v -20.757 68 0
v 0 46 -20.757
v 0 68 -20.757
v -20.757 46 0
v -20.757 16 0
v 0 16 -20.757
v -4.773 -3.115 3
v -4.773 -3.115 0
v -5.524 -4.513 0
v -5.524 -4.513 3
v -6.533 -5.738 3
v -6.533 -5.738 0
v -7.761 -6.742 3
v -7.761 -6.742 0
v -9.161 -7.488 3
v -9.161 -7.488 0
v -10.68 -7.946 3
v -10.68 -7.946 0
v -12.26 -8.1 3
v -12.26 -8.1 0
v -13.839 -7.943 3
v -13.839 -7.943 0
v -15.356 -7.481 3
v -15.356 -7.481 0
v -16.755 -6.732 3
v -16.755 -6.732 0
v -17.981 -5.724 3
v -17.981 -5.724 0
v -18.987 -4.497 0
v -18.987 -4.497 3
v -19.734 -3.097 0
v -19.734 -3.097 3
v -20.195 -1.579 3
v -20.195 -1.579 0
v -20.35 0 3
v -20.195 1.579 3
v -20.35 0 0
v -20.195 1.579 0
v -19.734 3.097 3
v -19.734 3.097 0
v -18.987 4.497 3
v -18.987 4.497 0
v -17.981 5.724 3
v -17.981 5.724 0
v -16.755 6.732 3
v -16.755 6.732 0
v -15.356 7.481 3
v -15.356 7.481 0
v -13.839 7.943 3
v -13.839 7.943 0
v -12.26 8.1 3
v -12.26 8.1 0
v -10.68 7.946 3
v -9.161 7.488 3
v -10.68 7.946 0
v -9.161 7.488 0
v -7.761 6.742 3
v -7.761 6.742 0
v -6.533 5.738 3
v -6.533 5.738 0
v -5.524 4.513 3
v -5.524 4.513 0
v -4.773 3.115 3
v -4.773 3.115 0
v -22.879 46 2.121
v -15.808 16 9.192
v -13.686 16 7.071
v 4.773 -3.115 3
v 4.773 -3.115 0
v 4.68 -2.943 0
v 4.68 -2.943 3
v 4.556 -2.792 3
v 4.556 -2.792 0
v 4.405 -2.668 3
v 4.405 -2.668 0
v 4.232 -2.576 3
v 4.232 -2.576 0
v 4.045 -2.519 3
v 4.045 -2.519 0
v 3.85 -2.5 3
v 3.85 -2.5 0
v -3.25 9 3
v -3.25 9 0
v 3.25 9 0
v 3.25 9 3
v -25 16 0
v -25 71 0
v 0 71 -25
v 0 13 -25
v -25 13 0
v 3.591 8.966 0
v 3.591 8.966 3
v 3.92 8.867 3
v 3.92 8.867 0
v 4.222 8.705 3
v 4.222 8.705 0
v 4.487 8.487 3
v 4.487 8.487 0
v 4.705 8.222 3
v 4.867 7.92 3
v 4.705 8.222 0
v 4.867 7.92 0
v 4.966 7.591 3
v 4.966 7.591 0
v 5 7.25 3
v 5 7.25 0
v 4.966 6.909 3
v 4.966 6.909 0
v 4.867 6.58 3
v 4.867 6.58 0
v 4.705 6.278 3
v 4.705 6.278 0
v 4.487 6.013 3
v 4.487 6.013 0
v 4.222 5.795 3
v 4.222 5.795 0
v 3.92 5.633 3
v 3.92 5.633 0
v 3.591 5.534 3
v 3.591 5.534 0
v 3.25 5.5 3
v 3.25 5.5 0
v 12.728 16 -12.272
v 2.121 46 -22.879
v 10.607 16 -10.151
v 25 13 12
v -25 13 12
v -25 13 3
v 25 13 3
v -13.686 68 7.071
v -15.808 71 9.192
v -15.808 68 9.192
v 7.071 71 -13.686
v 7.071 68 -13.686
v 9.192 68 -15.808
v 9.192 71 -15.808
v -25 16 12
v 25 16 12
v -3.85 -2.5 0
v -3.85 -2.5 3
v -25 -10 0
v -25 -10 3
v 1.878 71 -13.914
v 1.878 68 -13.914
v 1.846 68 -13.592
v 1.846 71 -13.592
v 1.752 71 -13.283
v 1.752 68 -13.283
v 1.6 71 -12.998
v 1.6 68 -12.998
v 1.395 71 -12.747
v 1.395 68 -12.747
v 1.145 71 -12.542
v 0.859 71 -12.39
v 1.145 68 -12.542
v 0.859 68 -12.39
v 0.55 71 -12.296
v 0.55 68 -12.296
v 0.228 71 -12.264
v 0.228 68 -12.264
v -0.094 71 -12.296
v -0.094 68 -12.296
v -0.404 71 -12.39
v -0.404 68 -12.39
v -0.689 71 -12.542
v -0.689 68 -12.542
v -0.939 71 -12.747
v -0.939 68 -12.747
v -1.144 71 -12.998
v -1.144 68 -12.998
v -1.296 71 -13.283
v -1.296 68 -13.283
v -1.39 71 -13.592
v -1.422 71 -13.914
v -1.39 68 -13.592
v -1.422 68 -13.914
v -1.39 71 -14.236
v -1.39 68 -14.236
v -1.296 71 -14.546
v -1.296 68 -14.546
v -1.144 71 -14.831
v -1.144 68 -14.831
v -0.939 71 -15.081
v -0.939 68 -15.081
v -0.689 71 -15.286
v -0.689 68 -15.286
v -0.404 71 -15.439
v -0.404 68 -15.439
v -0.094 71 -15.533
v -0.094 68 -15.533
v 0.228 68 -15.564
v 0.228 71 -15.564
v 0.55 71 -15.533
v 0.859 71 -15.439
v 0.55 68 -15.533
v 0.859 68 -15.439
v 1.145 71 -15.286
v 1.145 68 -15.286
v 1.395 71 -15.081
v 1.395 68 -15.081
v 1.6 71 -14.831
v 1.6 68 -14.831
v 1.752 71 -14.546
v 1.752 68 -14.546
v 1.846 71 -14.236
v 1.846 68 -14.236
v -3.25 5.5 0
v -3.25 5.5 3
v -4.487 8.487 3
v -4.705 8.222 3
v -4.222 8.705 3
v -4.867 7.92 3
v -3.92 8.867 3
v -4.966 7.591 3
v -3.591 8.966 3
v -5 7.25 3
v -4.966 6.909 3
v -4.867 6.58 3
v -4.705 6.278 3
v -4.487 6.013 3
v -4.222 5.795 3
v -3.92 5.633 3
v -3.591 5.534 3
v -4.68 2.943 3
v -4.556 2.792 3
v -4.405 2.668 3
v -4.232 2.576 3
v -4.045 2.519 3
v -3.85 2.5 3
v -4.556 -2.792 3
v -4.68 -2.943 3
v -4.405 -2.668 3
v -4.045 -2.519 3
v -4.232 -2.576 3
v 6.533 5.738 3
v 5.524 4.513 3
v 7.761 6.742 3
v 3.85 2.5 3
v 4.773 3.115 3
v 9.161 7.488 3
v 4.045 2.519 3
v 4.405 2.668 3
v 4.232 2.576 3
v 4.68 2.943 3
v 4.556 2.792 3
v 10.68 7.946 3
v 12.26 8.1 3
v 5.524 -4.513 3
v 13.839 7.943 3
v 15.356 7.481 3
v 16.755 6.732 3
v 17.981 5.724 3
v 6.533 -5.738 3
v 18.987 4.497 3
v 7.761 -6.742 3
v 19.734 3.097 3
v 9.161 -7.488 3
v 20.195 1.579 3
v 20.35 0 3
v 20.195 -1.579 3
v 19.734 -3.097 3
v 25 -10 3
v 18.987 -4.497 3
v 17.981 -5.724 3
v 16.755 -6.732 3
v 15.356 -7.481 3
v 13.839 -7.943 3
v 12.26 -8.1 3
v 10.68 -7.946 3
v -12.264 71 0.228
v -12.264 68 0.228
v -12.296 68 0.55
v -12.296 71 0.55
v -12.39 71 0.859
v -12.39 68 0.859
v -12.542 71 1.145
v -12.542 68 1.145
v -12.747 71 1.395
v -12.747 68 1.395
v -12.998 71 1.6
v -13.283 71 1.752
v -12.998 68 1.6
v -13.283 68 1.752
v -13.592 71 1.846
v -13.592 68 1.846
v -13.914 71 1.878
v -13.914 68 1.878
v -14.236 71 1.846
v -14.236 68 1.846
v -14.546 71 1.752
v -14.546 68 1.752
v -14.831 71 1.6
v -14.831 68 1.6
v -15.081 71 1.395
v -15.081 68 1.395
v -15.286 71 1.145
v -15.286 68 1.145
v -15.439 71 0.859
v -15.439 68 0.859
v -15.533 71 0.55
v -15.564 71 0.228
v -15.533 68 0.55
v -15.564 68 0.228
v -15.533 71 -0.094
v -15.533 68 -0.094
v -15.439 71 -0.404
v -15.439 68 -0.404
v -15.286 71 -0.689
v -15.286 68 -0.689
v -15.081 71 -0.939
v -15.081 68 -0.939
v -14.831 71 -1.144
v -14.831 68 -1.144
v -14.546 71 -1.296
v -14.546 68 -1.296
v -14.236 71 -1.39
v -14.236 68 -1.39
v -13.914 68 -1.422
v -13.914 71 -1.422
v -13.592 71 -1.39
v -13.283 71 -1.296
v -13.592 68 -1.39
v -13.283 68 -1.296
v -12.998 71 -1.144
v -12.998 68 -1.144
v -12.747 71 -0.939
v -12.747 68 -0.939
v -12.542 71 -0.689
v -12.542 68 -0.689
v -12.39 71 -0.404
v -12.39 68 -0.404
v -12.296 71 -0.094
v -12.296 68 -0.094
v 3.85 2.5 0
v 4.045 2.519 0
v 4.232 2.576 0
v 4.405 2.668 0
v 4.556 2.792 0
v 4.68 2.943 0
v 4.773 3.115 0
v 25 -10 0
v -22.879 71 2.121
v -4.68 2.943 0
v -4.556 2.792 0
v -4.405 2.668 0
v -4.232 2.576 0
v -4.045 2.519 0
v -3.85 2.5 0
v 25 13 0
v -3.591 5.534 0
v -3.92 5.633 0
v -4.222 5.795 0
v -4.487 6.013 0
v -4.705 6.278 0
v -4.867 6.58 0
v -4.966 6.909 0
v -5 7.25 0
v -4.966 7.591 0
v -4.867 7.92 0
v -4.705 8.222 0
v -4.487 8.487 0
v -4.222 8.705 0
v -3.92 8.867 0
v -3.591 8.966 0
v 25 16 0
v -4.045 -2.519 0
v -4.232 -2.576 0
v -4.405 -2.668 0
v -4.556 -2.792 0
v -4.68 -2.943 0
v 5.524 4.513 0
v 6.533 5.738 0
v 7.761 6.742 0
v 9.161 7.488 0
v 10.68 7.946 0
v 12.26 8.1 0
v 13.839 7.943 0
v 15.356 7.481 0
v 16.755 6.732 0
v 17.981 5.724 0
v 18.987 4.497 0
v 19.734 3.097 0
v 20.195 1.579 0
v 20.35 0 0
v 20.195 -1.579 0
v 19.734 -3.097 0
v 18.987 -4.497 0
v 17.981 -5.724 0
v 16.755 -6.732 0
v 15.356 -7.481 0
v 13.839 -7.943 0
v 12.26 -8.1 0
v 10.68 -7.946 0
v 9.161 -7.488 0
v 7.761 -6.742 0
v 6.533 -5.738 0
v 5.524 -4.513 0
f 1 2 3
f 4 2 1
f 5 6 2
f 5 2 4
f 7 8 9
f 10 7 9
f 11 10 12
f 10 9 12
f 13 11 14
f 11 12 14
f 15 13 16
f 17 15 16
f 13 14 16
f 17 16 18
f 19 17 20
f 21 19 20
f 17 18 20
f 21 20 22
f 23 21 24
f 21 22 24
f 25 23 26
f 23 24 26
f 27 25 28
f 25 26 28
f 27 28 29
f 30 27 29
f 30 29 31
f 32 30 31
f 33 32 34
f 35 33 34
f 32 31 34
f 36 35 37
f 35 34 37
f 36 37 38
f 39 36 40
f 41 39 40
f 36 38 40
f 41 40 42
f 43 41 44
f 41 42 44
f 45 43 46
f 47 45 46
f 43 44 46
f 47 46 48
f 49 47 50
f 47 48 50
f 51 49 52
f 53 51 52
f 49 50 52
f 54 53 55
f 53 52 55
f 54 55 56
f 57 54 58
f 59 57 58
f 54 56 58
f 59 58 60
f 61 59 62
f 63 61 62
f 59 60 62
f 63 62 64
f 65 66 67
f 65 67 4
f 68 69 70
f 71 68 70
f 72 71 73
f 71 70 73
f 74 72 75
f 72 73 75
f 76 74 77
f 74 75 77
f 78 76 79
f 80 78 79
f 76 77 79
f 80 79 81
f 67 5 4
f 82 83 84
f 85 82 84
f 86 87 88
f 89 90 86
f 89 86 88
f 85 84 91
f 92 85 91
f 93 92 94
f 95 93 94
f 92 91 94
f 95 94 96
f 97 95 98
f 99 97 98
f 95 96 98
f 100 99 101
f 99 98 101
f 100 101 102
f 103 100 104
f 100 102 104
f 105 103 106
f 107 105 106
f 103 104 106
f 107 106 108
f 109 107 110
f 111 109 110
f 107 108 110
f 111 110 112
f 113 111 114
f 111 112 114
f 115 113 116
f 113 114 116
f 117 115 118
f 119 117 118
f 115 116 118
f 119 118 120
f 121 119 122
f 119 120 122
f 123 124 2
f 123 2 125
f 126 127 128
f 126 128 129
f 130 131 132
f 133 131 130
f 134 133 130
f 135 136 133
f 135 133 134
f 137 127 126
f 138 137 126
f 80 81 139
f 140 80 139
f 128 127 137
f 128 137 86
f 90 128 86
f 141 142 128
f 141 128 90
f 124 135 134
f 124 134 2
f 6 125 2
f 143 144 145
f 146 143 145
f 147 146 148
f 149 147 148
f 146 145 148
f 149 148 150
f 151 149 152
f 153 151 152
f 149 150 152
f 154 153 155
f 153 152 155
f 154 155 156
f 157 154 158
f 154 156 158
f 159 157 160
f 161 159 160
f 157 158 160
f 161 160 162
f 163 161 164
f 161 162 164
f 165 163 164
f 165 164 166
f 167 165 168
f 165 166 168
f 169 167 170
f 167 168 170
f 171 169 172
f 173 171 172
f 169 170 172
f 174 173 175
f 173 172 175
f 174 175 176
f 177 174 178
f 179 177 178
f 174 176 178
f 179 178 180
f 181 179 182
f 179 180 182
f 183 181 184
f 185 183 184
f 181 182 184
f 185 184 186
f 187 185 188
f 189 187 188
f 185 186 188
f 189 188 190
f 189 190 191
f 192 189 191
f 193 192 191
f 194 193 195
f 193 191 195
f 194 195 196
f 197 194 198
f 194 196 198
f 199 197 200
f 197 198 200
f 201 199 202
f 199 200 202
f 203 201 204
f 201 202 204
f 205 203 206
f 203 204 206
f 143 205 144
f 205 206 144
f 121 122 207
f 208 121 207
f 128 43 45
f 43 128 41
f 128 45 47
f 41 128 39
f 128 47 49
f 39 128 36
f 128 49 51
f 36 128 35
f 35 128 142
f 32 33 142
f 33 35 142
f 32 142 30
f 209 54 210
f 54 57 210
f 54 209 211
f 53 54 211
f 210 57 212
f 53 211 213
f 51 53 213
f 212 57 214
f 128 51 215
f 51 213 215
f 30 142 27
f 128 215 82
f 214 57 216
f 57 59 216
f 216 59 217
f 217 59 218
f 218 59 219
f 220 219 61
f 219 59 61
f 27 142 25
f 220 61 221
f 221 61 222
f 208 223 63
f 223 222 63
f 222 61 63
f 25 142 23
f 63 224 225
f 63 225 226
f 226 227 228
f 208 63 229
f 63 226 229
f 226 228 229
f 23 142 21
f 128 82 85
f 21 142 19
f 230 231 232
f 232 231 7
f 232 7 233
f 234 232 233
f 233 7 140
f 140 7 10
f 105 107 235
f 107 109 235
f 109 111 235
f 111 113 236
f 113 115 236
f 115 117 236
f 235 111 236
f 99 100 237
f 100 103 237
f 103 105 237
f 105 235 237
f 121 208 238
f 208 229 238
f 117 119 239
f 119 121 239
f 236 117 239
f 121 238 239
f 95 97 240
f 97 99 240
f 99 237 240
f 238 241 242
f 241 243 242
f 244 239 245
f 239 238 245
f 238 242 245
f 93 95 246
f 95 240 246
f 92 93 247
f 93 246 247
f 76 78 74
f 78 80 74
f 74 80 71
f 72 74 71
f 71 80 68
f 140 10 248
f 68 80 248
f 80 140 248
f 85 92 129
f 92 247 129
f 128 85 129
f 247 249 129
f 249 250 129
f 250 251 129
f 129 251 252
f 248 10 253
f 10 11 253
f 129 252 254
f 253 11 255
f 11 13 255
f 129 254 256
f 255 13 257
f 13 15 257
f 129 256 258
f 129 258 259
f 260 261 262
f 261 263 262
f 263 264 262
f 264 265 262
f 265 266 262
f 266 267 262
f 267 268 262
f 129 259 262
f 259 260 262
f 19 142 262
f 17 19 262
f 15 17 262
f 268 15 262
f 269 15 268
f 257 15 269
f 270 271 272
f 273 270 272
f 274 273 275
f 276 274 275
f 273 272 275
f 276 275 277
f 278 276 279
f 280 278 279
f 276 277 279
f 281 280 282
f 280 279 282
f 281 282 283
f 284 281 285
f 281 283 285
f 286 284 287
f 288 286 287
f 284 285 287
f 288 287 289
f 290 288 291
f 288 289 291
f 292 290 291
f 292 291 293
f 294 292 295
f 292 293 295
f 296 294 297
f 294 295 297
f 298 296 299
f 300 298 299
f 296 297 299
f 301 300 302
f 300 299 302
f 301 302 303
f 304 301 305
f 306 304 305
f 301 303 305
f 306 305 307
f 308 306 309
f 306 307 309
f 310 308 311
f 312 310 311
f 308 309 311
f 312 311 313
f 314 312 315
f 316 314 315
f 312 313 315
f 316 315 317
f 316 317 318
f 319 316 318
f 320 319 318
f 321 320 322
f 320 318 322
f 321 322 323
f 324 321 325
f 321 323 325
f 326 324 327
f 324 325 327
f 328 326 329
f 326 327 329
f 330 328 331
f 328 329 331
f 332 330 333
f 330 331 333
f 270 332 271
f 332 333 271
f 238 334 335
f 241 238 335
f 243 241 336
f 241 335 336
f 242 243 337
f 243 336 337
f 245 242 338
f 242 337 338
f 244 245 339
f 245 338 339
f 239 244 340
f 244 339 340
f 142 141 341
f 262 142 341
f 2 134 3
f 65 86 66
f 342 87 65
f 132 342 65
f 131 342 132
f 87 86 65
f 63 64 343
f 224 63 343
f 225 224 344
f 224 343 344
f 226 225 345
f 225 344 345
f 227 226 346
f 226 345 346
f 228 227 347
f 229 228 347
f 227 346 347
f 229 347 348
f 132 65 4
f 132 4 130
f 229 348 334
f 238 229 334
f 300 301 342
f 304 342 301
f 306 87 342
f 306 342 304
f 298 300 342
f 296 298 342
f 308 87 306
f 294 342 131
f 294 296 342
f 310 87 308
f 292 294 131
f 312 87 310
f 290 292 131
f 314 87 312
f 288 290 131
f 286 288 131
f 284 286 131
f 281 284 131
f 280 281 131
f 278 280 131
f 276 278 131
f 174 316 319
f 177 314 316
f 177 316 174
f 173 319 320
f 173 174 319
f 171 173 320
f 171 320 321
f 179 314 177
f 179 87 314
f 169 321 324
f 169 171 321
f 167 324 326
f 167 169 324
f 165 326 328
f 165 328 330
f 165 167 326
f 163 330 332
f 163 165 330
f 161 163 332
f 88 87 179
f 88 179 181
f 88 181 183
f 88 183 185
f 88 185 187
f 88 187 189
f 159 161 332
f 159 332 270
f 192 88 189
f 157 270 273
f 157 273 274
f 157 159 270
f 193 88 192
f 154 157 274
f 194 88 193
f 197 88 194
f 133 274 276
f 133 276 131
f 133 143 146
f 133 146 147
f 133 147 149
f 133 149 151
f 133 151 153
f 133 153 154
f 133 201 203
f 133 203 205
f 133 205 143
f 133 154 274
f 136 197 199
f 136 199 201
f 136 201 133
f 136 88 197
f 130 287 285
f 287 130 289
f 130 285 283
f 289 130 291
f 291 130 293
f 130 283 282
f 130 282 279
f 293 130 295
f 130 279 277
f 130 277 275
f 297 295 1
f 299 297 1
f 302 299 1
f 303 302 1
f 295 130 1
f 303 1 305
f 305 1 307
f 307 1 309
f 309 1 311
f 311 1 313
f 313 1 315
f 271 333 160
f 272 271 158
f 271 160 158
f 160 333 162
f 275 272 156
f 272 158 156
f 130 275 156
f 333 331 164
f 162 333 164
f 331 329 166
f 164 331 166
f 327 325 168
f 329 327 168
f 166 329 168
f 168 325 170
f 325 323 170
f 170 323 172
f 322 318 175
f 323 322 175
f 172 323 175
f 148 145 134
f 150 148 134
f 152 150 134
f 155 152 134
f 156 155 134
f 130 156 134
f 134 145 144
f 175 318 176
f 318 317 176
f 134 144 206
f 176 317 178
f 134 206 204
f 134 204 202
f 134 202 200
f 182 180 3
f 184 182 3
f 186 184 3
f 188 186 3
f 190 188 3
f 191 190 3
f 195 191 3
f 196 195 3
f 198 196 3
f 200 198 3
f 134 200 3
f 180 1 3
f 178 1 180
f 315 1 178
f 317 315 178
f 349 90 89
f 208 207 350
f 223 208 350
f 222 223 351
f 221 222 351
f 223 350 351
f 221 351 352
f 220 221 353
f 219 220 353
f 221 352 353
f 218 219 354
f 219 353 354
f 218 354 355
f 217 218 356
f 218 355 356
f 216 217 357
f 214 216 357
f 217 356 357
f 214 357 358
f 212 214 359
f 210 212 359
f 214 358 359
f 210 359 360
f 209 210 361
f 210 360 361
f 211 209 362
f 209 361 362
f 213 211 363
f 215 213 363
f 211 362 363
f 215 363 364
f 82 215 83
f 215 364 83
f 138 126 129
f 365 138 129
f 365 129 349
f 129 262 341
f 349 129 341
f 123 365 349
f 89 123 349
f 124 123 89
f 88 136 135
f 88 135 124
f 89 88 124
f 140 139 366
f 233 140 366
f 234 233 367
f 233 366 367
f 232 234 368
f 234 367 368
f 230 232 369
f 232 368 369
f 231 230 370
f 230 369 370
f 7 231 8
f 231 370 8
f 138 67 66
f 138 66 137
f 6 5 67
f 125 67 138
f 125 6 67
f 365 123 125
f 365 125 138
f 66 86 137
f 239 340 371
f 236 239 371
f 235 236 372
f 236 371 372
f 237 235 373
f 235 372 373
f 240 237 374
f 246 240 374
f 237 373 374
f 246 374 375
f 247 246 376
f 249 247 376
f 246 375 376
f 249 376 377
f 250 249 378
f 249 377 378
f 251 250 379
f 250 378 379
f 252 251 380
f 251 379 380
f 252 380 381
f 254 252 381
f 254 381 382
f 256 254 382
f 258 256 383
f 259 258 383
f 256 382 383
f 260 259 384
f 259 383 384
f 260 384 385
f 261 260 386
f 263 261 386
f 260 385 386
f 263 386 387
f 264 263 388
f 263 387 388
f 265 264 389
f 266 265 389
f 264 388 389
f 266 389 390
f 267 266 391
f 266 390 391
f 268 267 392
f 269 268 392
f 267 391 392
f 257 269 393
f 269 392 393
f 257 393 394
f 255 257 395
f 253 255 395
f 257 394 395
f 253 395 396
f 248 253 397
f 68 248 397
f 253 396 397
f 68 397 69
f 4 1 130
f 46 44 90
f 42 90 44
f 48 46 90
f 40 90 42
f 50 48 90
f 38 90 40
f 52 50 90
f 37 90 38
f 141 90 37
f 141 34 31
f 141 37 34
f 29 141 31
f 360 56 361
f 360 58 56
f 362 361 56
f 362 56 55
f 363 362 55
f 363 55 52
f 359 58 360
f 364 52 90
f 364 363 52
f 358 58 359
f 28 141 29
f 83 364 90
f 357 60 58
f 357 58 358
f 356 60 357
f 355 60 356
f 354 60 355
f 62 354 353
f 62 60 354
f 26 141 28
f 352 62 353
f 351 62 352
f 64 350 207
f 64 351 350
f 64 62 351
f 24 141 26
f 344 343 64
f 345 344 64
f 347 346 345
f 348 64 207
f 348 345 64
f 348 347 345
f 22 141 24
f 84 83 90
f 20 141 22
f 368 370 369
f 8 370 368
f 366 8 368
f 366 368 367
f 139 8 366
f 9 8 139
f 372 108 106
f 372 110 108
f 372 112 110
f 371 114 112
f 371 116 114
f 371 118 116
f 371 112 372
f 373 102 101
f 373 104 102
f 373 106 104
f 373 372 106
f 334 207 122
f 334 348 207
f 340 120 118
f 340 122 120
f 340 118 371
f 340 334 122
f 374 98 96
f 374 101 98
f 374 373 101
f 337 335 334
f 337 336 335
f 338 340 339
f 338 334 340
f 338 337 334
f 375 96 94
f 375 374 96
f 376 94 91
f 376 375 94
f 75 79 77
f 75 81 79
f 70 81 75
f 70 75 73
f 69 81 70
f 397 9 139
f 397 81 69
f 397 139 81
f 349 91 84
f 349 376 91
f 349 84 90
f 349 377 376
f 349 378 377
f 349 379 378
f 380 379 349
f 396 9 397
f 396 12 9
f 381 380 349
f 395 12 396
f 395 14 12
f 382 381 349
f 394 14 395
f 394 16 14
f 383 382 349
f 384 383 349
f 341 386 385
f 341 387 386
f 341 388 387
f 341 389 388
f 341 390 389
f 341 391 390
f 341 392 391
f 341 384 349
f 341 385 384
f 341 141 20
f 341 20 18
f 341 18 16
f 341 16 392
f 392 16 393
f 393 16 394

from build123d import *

# Parameters (mm, degrees)
SKETCH_1_W          = 50
SKETCH_1_H          = 20
EXTRUDE_1_DEPTH     = 3
SKETCH_2_W          = 50
SKETCH_2_H          = 12
EXTRUDE_2_DEPTH     = 6
SKETCH_5_W          = 50
SKETCH_5_H          = 9
CUT_EXTRUDE_2_DEPTH = 3
EXTRUDE_3_DEPTH     = 3
EXTRUDE_4_DEPTH     = 55
SKETCH_12_W         = 32.35533906
SKETCH_12_H         = 3
EXTRUDE_6_DEPTH     = 10
EXTRUDE_7_DEPTH     = 3
EXTRUDE_8_DEPTH     = 3
SKETCH_15_R         = 1.65
CUT_EXTRUDE_3_DEPTH = 3


with BuildPart() as part:
    # 草图1 → 凸台-拉伸1 (new body)
    with BuildSketch(Plane.XY):
        Rectangle(SKETCH_1_W, SKETCH_1_H)
        with BuildLine():
            Line((-3.85, 2.5), (3.85, 2.5))
            ThreePointArc((3.85, 2.5), (4.404700196, 2.667949706), (4.773076923, 3.115384615))
            ThreePointArc((4.773076923, 3.115384615), (20.35, 0), (4.773076923, -3.115384615))
            ThreePointArc((4.773076923, -3.115384615), (4.404700196, -2.667949706), (3.85, -2.5))
            Line((3.85, -2.5), (-3.85, -2.5))
            ThreePointArc((-3.85, -2.5), (-4.404700196, -2.667949706), (-4.773076923, -3.115384615))
            ThreePointArc((-4.773076923, -3.115384615), (-20.35, 0), (-4.773076923, 3.115384615))
            ThreePointArc((-4.773076923, 3.115384615), (-4.404700196, 2.667949706), (-3.85, 2.5))
        make_face(mode=Mode.SUBTRACT)
        with BuildLine():
            Line((3.25, 5.5), (-3.25, 5.5))
            ThreePointArc((-3.25, 5.5), (-5, 7.25), (-3.25, 9))
            Line((-3.25, 9), (3.25, 9))
            ThreePointArc((3.25, 9), (5, 7.25), (3.25, 5.5))
        make_face(mode=Mode.SUBTRACT)
    extrude(amount=EXTRUDE_1_DEPTH)

    # 草图2 → 凸台-拉伸2 (add)
    with BuildSketch(Plane(origin=(0, 10, 0), x_dir=(1, 0, 0), z_dir=(0, 1, 0))):
        with Locations((0, -6)):
            Rectangle(SKETCH_2_W, SKETCH_2_H)
    extrude(amount=EXTRUDE_2_DEPTH)

    # 草图5 → 切除-拉伸2 (cut)
    with BuildSketch(Plane.XZ.offset(-10)):
        with Locations((0, 7.5)):
            Rectangle(SKETCH_5_W, SKETCH_5_H)
    extrude(amount=-CUT_EXTRUDE_2_DEPTH, mode=Mode.SUBTRACT)

    # 草图9 → 凸台-拉伸3 (add)
    with BuildSketch(Plane(origin=(0, 16, 0), x_dir=(1, 0, 0), z_dir=(0, 1, 0))):
        Polygon((25, 0), (0, 25), (-25, 0), align=None)
    extrude(amount=-EXTRUDE_3_DEPTH)

    # 草图11 → 凸台-拉伸4 (add)
    with BuildSketch(Plane(origin=(0, 16, 0), x_dir=(1, 0, 0), z_dir=(0, 1, 0))):
        Polygon((0, 25), (2.121320344, 22.878679656), (-22.878679656, -2.121320344), (-25, 0), align=None)
    extrude(amount=EXTRUDE_4_DEPTH)

    # 草图12 → 凸台-拉伸6 (add)
    with BuildSketch(Plane(origin=(-10.378679656, 0, -10.378679656), x_dir=(0.707106781, 0, -0.707106781), z_dir=(0.707106781, 0, 0.707106781))):
        with Locations((-1.5, 69.5)):
            Rectangle(SKETCH_12_W, SKETCH_12_H)
    extrude(amount=EXTRUDE_6_DEPTH)

    # 草图13 → 凸台-拉伸7 (add)
    with BuildSketch(Plane(origin=(12.5, 0, -12.5), x_dir=(-0.707106781, 0, -0.707106781), z_dir=(0.707106781, 0, -0.707106781))):
        Polygon((14.67766953, 16), (14.67766953, 46), (-0.32233047, 16), align=None)
        Polygon((14.67766953, 46), (14.67766953, 71), (4.67766953, 71), (4.67766953, 68), align=None)
    extrude(amount=-EXTRUDE_7_DEPTH)

    # 草图14 → 凸台-拉伸8 (add)
    with BuildSketch(Plane(origin=(-12.5, 0, 12.5), x_dir=(0.707106781, 0, 0.707106781), z_dir=(-0.707106781, 0, 0.707106781))):
        Polygon((-14.67766953, 46), (-14.67766953, 16), (-4.67766953, 16), align=None)
        Polygon((-14.67766953, 68), (-14.67766953, 46), (-4.67766953, 68), align=None)
    extrude(amount=-EXTRUDE_8_DEPTH)

    # 草图15 → 切除-拉伸3 (cut)
    with BuildSketch(Plane.XZ.offset(-68)):
        with Locations((0.227922061, -13.914213562)):
            Circle(SKETCH_15_R)
        with Locations((-13.914213562, 0.227922061)):
            Circle(SKETCH_15_R)
    extrude(amount=-CUT_EXTRUDE_3_DEPTH, mode=Mode.SUBTRACT)


solid = part.part
